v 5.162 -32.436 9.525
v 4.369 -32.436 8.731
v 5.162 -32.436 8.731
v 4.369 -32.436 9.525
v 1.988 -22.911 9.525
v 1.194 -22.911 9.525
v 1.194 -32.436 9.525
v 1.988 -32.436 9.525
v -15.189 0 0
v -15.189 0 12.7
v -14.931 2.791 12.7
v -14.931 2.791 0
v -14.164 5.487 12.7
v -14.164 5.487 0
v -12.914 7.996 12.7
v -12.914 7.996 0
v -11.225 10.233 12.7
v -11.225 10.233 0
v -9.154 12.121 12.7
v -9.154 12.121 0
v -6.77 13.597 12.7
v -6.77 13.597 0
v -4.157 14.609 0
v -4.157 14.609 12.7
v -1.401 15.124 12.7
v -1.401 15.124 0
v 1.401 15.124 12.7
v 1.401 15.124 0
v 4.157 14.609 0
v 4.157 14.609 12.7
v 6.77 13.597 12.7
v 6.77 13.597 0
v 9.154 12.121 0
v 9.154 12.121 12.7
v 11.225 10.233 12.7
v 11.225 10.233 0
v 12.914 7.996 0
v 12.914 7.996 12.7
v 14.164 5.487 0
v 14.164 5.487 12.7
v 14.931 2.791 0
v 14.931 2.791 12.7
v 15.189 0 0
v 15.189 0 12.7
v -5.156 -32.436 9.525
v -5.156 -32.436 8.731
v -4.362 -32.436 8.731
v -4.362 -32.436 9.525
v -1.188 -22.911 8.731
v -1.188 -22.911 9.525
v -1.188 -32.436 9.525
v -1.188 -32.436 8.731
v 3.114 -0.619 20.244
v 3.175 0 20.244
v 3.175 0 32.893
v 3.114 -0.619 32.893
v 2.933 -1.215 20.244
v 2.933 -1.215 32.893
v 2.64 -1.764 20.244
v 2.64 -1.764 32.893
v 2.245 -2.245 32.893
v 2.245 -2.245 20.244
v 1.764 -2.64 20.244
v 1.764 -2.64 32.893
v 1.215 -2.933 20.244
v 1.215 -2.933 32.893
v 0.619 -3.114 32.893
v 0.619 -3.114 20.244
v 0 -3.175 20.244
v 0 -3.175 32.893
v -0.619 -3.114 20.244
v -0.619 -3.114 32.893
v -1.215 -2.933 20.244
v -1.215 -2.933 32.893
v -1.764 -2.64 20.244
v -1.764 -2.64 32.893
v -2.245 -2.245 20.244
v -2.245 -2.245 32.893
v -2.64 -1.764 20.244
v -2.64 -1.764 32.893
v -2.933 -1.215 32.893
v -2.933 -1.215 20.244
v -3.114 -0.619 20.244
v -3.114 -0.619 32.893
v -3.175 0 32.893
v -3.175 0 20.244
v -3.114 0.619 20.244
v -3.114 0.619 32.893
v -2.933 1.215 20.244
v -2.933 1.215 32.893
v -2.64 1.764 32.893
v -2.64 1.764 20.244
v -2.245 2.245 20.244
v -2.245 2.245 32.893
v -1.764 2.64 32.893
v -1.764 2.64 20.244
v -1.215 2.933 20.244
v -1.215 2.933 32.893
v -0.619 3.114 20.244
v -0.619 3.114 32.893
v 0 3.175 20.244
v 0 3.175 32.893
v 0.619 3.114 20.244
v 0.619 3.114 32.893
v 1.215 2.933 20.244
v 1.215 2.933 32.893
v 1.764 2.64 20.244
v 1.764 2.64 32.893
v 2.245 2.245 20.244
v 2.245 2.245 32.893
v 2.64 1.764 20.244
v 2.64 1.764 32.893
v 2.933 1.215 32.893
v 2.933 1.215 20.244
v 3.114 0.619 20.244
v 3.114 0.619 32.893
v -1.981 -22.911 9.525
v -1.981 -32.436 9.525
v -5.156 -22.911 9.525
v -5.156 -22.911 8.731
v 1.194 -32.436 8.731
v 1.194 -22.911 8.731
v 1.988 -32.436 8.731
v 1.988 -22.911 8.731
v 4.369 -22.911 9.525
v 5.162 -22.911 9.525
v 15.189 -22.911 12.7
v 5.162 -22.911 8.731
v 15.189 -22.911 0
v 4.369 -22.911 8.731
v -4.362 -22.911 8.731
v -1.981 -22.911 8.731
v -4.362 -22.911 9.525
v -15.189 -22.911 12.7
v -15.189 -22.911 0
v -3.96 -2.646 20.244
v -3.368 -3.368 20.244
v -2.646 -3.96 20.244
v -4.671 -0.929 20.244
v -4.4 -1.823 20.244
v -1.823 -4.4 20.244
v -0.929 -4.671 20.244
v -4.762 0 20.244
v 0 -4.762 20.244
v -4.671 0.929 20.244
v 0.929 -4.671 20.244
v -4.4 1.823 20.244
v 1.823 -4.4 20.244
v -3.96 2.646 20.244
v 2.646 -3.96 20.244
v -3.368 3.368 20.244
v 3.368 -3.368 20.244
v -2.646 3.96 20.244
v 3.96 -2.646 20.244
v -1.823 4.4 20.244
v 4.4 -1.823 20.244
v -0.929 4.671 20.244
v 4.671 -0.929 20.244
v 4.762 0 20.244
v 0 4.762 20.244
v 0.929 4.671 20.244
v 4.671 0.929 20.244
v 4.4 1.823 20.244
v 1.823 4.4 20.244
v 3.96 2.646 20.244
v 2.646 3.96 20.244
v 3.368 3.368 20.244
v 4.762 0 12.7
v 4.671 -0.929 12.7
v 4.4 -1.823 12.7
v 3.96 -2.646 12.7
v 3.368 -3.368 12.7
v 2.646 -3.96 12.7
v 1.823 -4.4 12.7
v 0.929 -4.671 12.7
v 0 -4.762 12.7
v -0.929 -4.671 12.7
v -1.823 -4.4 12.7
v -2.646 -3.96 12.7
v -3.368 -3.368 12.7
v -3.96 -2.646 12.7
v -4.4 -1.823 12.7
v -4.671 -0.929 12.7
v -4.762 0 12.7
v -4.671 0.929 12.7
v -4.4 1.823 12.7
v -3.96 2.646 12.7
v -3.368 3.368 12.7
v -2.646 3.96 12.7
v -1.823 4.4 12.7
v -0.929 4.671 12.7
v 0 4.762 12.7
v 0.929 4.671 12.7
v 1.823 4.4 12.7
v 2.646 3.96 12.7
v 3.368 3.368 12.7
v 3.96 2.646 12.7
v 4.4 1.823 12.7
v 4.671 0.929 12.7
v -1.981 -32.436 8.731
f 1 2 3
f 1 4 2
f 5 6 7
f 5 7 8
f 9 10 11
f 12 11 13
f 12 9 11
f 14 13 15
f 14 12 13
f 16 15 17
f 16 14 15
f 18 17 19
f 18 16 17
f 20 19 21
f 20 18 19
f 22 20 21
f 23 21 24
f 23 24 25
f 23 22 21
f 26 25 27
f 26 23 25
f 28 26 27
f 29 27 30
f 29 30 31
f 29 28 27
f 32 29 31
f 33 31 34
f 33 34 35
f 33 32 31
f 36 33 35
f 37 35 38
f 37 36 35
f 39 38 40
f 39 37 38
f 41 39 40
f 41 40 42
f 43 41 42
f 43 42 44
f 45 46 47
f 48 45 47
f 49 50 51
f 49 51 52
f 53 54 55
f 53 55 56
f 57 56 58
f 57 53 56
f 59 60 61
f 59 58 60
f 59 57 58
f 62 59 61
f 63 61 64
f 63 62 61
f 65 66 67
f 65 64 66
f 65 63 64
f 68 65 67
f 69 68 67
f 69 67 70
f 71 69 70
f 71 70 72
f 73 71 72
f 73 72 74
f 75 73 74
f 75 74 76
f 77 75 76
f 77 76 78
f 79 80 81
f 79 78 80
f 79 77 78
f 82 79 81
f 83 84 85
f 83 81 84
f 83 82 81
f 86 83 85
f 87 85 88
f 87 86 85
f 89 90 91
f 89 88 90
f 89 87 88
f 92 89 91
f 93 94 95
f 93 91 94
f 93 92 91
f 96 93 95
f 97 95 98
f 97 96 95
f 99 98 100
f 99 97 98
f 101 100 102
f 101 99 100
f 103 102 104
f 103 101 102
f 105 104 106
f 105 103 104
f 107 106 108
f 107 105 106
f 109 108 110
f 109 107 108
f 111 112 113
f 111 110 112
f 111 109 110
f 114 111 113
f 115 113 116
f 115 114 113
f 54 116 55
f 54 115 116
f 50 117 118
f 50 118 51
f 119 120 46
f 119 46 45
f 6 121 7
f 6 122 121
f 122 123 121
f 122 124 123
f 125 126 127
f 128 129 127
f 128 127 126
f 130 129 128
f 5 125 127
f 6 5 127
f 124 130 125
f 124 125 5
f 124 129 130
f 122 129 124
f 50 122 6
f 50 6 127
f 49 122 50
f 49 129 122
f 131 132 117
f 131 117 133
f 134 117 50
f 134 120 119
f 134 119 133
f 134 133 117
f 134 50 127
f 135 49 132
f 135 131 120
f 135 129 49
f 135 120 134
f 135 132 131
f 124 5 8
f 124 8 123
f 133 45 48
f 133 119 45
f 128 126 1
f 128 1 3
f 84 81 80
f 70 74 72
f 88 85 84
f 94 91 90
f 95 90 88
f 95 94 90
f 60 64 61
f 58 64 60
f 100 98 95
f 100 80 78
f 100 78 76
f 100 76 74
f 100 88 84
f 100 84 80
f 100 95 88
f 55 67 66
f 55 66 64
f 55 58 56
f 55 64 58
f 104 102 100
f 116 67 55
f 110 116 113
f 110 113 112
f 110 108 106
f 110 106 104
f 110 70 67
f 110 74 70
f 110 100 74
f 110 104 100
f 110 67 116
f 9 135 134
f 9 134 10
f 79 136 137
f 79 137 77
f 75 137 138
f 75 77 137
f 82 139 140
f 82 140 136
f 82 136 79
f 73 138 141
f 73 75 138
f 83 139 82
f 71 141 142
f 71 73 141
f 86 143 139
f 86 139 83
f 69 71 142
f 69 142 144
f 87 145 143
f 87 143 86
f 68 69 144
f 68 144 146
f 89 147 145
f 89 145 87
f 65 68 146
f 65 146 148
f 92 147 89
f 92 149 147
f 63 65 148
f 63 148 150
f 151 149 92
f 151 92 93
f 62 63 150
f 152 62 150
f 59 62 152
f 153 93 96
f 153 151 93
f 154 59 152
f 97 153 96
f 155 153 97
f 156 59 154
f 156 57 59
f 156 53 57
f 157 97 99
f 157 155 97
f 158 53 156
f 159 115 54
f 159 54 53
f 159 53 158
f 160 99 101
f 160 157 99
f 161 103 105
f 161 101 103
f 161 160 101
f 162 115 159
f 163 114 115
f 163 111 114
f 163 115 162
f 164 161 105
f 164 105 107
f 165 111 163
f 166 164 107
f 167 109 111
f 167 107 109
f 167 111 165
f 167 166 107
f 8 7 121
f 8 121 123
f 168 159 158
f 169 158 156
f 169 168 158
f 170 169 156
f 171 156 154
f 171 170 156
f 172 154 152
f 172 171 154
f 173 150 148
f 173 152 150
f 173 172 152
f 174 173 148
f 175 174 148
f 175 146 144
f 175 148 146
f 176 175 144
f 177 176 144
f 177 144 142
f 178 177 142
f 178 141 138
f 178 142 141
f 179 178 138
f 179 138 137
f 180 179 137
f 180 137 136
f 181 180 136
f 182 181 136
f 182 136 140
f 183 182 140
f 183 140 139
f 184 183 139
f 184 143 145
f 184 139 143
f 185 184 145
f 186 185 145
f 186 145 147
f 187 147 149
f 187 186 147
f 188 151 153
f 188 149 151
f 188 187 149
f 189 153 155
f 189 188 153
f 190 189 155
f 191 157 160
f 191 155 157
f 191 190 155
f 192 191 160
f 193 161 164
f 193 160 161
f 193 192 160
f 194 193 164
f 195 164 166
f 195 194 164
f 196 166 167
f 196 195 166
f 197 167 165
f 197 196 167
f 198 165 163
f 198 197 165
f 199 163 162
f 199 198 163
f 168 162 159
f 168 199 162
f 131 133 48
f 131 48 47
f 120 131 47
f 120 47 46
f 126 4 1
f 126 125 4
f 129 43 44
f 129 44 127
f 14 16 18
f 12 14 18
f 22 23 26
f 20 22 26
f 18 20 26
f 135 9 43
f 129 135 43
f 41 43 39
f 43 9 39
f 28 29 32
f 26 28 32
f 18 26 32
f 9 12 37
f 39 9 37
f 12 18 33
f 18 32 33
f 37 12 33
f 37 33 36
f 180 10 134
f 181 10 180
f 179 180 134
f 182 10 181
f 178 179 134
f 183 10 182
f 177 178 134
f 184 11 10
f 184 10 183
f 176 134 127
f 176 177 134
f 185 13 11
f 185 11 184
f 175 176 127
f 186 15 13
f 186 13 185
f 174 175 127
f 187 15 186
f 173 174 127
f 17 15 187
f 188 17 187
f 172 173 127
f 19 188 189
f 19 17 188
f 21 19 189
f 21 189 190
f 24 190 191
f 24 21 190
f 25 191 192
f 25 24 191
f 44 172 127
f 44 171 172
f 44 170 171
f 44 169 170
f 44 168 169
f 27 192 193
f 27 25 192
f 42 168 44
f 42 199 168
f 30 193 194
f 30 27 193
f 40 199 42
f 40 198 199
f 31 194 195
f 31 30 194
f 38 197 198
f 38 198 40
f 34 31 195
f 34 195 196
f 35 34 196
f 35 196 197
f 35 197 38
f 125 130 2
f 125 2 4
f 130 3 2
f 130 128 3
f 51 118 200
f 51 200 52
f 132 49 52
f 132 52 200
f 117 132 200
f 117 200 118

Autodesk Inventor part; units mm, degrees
ref_plane "YZ Plane" through (0, 0, 0) normal (1, 0, 0) x (0, 1, 0)
ref_plane "XZ Plane" through (0, 0, 0) normal (0, 1, 0) x (-1, 0, 0)
ref_plane "XY Plane" through (0, 0, 0) normal (0, 0, 1) x (1, 0, 0)
sketch "Sketch1" plane through (0, 0, 0) normal (0, 0, 1) x (1, 0, 0)
  line L0 (-21.2649, 0) -> (21.2649, 0) projected
  line L1 (0, -30.5308) -> (0, 22.8092) projected
  arc A0 (15.1892, 0) -> (-15.1892, 0) centre (0, 0) ccw
  line L2 (-15.1892, 0) -> (15.1892, 0)
  line L3 (15.1892, 0) -> (15.1892, -22.9108)
  line L4 (15.1892, -22.9108) -> (-15.1892, -22.9108)
  line L5 (-15.1892, -22.9108) -> (-15.1892, 0)
  dimension "d0" = 30.3784
  dimension "d1" = 38.1
extrude "Extrusion1" add sketch "Sketch1" along normal blind 12.7
sketch "Sketch2" plane through (0, 0, 12.7) normal (0, 0, 1) x (1, 0, 0)
  arc A0 (15.1892, 0) -> (-15.1892, 0) centre (0, 0) ccw projected
  circle A1 centre (0, 0) radius 4.7625
  dimension "d4" = 9.525
extrude "Extrusion2" add sketch "Sketch2" along normal blind 7.5438
sketch "Sketch3" plane through (0, 0, 20.2438) normal (0, 0, 1) x (1, 0, 0)
  circle A0 centre (0, 0) radius 4.7625 projected
  circle A1 centre (0, 0) radius 3.175
  dimension "d7" = 6.35
extrude "Extrusion3" add sketch "Sketch3" along normal blind 12.6492 contours A1
thread "Thread1" size "3/8-16 UNC" class "2A" standard "ANSI Unified Screw Threads" full length
sketch "Sketch4" plane through (-15.1892, -22.9108, 0) normal (0, -1, 0) x (1, 0, 0)
  line L0 (30.3784, 12.7) -> (0, 12.7) projected
  line L1 (0, 0) -> (0, 12.7) projected
  line L2 (10.033, 9.525) -> (10.8267, 9.525)
  line L3 (10.8267, 9.525) -> (10.8267, 8.7313)
  line L4 (10.8267, 8.7313) -> (10.033, 8.7313)
  line L5 (10.033, 8.7313) -> (10.033, 9.525)
  line L6 (13.208, 9.525) -> (14.0017, 9.525)
  line L7 (14.0017, 9.525) -> (14.0017, 8.7313)
  line L8 (14.0017, 8.7313) -> (13.208, 8.7313)
  line L9 (13.208, 8.7313) -> (13.208, 9.525)
  line L10 (16.383, 9.525) -> (17.1767, 9.525)
  line L11 (17.1767, 9.525) -> (17.1767, 8.7313)
  line L12 (17.1767, 8.7313) -> (16.383, 8.7313)
  line L13 (16.383, 8.7313) -> (16.383, 9.525)
  line L14 (19.558, 9.525) -> (20.3517, 9.525)
  line L15 (20.3517, 9.525) -> (20.3517, 8.7313)
  line L16 (20.3517, 8.7313) -> (19.558, 8.7313)
  line L17 (19.558, 8.7313) -> (19.558, 9.525)
  point P0 (15.1892, 0)
  dimension "d12" = 0.7937
  dimension "d13" = 10.033
  dimension "d14" = 3.175
  dimension "d17" = 3.175
extrude "Pins" add sketch "Sketch4" along normal blind 9.525
properties part number "encoder"
